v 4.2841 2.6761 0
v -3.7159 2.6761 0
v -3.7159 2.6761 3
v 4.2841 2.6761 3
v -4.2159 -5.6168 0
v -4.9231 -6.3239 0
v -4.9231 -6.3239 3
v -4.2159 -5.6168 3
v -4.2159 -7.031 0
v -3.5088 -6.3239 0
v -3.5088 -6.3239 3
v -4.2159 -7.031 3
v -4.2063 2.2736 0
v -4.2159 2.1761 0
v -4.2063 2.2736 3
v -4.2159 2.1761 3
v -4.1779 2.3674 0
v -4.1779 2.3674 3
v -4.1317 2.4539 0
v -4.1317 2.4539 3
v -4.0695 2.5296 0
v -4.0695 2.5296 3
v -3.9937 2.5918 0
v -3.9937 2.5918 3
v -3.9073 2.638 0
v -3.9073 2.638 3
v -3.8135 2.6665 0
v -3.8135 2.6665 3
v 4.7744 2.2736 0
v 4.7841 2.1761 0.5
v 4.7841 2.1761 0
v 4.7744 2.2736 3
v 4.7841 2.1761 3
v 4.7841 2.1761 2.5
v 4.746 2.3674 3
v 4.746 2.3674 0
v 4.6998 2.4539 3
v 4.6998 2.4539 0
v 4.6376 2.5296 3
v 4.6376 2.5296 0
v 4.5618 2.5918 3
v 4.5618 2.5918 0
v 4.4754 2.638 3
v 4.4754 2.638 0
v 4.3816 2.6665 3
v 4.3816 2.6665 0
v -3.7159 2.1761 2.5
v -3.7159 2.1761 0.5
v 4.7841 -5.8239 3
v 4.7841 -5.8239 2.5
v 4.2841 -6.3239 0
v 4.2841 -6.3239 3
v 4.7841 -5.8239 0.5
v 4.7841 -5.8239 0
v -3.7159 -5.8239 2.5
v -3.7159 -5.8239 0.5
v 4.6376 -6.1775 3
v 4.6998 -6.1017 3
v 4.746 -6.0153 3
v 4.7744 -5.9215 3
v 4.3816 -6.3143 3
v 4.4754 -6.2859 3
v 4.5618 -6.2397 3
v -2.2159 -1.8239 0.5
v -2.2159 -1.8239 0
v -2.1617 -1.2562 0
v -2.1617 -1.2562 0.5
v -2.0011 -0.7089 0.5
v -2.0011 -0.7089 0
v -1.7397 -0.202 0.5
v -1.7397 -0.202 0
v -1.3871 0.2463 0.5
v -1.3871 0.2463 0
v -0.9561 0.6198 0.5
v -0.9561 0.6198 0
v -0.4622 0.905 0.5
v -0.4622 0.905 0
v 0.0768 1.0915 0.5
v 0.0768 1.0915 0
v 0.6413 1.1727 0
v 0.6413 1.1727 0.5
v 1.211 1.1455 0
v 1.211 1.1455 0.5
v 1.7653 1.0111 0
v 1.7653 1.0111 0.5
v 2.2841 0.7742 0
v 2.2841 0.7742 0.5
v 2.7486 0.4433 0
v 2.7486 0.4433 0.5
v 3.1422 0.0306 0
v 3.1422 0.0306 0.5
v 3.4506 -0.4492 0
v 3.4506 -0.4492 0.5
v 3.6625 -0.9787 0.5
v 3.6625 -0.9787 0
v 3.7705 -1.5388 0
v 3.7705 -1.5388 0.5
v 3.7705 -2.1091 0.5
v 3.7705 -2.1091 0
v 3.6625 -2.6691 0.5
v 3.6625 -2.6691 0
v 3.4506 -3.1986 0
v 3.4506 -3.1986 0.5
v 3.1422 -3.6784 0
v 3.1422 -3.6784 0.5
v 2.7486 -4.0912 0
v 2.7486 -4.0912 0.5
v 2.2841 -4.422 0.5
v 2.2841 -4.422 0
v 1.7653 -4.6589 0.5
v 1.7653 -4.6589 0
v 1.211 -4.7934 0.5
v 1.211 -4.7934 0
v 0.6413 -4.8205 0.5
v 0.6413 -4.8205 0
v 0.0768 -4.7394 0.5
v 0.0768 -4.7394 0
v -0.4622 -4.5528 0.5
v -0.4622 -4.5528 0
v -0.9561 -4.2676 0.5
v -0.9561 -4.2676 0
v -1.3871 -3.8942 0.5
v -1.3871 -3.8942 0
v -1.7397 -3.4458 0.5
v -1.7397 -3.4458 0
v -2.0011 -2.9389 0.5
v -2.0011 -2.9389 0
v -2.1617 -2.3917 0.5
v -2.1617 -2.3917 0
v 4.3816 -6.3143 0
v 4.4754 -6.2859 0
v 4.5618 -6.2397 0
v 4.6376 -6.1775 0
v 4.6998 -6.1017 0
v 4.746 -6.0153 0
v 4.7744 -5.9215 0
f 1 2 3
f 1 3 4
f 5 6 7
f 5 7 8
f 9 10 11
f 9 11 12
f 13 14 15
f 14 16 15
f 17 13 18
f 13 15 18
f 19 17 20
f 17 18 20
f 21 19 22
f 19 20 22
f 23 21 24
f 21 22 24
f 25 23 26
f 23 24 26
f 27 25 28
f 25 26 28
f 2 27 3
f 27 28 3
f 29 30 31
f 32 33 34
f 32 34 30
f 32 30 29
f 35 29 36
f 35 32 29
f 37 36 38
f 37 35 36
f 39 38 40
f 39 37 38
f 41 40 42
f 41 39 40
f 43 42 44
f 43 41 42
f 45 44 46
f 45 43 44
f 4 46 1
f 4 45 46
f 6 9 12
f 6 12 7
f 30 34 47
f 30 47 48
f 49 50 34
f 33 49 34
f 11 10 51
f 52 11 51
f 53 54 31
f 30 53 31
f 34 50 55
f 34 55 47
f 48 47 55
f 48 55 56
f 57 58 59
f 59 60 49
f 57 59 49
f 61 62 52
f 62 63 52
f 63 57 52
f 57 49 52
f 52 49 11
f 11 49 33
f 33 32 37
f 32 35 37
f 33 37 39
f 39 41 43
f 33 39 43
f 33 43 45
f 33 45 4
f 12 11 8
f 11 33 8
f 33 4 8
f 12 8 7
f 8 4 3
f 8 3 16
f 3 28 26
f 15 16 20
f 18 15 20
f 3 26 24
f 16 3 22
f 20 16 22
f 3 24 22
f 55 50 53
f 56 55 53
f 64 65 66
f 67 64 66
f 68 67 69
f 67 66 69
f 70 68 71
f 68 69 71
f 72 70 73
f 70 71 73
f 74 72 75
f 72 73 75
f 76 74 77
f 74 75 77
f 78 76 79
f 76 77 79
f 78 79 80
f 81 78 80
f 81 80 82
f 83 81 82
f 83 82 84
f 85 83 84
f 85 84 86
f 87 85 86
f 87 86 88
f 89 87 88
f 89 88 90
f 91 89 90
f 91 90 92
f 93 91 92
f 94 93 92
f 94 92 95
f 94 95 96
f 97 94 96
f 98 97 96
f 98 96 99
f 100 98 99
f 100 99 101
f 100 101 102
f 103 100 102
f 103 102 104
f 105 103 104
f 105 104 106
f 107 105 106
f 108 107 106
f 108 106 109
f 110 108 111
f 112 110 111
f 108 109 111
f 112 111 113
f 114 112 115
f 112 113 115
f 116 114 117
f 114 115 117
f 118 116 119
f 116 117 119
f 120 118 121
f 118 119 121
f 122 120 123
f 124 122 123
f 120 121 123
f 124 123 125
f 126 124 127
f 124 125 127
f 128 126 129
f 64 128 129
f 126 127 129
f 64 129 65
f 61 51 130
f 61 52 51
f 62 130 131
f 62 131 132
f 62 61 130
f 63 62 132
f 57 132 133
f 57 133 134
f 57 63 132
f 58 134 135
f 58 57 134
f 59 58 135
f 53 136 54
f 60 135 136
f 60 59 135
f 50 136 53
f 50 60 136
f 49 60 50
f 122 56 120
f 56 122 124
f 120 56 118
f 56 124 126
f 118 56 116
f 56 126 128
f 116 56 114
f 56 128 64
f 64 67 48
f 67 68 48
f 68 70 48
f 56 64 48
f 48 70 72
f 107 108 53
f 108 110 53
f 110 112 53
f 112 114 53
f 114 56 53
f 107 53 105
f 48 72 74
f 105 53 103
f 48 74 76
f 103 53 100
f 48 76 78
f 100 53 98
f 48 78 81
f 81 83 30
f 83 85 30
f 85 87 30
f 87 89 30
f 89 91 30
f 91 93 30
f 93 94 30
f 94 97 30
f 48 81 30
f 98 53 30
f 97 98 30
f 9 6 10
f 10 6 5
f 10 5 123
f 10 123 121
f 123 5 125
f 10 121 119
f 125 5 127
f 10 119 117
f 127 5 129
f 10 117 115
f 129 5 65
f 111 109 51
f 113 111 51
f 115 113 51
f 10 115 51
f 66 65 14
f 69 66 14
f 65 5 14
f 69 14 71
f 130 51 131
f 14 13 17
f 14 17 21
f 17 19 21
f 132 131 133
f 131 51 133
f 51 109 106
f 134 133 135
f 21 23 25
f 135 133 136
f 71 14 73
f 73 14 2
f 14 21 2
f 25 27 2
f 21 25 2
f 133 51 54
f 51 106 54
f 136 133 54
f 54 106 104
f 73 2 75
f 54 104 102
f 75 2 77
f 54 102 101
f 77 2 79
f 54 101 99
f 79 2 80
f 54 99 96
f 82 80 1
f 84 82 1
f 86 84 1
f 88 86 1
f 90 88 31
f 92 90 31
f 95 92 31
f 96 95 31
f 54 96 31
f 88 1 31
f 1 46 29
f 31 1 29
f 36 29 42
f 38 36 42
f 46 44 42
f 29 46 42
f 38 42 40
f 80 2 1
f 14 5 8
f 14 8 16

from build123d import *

# Parameters (mm, degrees)
SKETCH_1_W          = 9
SKETCH_1_H          = 9
EXTRUDE_1_DEPTH     = 3
FILLET_1_R          = 0.5
SKETCH_2_R          = 3
CUT_EXTRUDE_1_DEPTH = 2.5
SKETCH_3_W          = 2
SKETCH_3_H          = 8
CUT_EXTRUDE_2_DEPTH = 8.5
EXTRUDE_2_DEPTH     = 3


with BuildPart() as part:
    # 草图1 → 凸台-拉伸1 (new body)
    with BuildSketch(Plane.XY):
        with Locations((0.284053156, -1.823920266)):
            Rectangle(SKETCH_1_W, SKETCH_1_H)
    extrude(amount=EXTRUDE_1_DEPTH)

    # 圆角1
    fillet_1_edges = [part.edges().sort_by_distance(p)[0] for p in [
        (-4.215946844, 2.676079734, 1.5),
        (4.784053156, 2.676079734, 1.5),
        (4.784053156, -6.323920266, 1.5),
        (-4.215946844, -6.323920266, 1.5),
    ]]
    fillet(fillet_1_edges, radius=FILLET_1_R)

    # 草图2 → 切除-拉伸1 (cut)
    with BuildSketch(Plane(origin=(0, 0, 0), x_dir=(-1, 0, 0), z_dir=(0, 0, -1))):
        with Locations((-0.784053156, -1.823920266)):
            Circle(SKETCH_2_R)
    extrude(amount=-CUT_EXTRUDE_1_DEPTH, mode=Mode.SUBTRACT)

    # 草图3 → 切除-拉伸2 (cut)
    with BuildSketch(Plane(origin=(4.784053156, 0, 0), x_dir=(0, 0, -1), z_dir=(1, 0, 0))):
        with Locations((-1.5, -1.823920266)):
            Rectangle(SKETCH_3_W, SKETCH_3_H)
    extrude(amount=-CUT_EXTRUDE_2_DEPTH, mode=Mode.SUBTRACT)

    # 草图4 → 凸台-拉伸2 (add)
    with BuildSketch(Plane(origin=(0, 0, 0), x_dir=(-1, 0, 0), z_dir=(0, 0, -1))):
        Polygon((4.215946844, -5.616813485), (3.508840063, -6.323920266), (4.215946844, -7.031027047), (4.923053625, -6.323920266), align=None)
    extrude(amount=-EXTRUDE_2_DEPTH)


solid = part.part
